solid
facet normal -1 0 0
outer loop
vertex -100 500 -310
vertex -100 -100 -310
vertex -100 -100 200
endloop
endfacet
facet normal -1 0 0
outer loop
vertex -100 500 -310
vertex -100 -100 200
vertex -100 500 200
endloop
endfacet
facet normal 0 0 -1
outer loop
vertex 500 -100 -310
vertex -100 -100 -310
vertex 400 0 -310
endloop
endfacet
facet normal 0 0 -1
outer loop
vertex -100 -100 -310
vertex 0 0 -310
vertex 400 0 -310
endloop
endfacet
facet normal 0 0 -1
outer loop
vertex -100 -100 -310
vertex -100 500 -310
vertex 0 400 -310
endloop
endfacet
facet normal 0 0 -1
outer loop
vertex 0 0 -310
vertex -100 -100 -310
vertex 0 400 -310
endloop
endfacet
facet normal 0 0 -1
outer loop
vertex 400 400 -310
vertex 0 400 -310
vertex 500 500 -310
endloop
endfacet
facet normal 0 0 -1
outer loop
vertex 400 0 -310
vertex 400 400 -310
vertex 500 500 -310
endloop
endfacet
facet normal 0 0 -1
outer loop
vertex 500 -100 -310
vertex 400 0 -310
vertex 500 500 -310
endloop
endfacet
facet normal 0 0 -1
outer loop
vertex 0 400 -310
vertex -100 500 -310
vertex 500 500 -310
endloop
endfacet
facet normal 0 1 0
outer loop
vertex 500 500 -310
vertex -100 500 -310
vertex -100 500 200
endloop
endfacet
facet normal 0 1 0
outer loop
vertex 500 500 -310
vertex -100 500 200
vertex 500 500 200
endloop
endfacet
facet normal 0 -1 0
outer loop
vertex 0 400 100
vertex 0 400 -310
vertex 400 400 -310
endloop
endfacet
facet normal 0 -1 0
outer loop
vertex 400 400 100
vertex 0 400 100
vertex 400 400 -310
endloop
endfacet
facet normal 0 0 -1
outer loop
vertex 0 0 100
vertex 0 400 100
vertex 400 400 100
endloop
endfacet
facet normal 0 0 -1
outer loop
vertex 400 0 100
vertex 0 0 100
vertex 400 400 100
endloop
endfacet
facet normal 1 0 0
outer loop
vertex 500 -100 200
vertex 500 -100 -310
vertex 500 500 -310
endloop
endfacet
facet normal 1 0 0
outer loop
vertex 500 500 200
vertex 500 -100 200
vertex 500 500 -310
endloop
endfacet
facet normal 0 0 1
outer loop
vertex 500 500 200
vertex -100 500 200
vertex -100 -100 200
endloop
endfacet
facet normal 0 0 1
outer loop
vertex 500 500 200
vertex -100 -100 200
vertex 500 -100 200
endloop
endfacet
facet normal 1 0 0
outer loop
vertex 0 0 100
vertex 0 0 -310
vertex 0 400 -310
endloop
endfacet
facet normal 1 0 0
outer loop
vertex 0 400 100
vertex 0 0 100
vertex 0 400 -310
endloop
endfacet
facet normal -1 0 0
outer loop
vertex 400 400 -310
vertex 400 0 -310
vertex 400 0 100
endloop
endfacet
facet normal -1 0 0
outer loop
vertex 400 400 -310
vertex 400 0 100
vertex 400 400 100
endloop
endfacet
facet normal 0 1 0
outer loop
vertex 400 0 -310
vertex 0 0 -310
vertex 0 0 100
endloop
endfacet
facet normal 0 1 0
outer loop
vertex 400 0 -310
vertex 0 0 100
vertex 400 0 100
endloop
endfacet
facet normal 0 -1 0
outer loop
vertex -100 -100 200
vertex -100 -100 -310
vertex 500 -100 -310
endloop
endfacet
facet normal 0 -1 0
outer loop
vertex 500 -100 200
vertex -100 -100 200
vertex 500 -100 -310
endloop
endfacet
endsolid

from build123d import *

# Parameters (mm, degrees)
BOX009_W     = 400
BOX009_H     = 400
BOX009_DEPTH = 410
BOX008_W     = 600
BOX008_H     = 600
BOX008_DEPTH = 510


with BuildPart() as cube008:
    # Box009 → Box009 (new body)
    with BuildSketch(Plane.XY.offset(-310)):
        with Locations((200, 200)):
            Rectangle(BOX009_W, BOX009_H)
    extrude(amount=BOX009_DEPTH)


with BuildPart() as cut004:
    # Box008 → Box008 (new body)
    with BuildSketch(Plane(origin=(-100, -100, -310), x_dir=(1, 0, 0), z_dir=(0, 0, 1))):
        with Locations((300, 300)):
            Rectangle(BOX008_W, BOX008_H)
    extrude(amount=BOX008_DEPTH)

    # Cut004: cut Cube008
    add(cube008.part, mode=Mode.SUBTRACT)


solid = cut004.part
